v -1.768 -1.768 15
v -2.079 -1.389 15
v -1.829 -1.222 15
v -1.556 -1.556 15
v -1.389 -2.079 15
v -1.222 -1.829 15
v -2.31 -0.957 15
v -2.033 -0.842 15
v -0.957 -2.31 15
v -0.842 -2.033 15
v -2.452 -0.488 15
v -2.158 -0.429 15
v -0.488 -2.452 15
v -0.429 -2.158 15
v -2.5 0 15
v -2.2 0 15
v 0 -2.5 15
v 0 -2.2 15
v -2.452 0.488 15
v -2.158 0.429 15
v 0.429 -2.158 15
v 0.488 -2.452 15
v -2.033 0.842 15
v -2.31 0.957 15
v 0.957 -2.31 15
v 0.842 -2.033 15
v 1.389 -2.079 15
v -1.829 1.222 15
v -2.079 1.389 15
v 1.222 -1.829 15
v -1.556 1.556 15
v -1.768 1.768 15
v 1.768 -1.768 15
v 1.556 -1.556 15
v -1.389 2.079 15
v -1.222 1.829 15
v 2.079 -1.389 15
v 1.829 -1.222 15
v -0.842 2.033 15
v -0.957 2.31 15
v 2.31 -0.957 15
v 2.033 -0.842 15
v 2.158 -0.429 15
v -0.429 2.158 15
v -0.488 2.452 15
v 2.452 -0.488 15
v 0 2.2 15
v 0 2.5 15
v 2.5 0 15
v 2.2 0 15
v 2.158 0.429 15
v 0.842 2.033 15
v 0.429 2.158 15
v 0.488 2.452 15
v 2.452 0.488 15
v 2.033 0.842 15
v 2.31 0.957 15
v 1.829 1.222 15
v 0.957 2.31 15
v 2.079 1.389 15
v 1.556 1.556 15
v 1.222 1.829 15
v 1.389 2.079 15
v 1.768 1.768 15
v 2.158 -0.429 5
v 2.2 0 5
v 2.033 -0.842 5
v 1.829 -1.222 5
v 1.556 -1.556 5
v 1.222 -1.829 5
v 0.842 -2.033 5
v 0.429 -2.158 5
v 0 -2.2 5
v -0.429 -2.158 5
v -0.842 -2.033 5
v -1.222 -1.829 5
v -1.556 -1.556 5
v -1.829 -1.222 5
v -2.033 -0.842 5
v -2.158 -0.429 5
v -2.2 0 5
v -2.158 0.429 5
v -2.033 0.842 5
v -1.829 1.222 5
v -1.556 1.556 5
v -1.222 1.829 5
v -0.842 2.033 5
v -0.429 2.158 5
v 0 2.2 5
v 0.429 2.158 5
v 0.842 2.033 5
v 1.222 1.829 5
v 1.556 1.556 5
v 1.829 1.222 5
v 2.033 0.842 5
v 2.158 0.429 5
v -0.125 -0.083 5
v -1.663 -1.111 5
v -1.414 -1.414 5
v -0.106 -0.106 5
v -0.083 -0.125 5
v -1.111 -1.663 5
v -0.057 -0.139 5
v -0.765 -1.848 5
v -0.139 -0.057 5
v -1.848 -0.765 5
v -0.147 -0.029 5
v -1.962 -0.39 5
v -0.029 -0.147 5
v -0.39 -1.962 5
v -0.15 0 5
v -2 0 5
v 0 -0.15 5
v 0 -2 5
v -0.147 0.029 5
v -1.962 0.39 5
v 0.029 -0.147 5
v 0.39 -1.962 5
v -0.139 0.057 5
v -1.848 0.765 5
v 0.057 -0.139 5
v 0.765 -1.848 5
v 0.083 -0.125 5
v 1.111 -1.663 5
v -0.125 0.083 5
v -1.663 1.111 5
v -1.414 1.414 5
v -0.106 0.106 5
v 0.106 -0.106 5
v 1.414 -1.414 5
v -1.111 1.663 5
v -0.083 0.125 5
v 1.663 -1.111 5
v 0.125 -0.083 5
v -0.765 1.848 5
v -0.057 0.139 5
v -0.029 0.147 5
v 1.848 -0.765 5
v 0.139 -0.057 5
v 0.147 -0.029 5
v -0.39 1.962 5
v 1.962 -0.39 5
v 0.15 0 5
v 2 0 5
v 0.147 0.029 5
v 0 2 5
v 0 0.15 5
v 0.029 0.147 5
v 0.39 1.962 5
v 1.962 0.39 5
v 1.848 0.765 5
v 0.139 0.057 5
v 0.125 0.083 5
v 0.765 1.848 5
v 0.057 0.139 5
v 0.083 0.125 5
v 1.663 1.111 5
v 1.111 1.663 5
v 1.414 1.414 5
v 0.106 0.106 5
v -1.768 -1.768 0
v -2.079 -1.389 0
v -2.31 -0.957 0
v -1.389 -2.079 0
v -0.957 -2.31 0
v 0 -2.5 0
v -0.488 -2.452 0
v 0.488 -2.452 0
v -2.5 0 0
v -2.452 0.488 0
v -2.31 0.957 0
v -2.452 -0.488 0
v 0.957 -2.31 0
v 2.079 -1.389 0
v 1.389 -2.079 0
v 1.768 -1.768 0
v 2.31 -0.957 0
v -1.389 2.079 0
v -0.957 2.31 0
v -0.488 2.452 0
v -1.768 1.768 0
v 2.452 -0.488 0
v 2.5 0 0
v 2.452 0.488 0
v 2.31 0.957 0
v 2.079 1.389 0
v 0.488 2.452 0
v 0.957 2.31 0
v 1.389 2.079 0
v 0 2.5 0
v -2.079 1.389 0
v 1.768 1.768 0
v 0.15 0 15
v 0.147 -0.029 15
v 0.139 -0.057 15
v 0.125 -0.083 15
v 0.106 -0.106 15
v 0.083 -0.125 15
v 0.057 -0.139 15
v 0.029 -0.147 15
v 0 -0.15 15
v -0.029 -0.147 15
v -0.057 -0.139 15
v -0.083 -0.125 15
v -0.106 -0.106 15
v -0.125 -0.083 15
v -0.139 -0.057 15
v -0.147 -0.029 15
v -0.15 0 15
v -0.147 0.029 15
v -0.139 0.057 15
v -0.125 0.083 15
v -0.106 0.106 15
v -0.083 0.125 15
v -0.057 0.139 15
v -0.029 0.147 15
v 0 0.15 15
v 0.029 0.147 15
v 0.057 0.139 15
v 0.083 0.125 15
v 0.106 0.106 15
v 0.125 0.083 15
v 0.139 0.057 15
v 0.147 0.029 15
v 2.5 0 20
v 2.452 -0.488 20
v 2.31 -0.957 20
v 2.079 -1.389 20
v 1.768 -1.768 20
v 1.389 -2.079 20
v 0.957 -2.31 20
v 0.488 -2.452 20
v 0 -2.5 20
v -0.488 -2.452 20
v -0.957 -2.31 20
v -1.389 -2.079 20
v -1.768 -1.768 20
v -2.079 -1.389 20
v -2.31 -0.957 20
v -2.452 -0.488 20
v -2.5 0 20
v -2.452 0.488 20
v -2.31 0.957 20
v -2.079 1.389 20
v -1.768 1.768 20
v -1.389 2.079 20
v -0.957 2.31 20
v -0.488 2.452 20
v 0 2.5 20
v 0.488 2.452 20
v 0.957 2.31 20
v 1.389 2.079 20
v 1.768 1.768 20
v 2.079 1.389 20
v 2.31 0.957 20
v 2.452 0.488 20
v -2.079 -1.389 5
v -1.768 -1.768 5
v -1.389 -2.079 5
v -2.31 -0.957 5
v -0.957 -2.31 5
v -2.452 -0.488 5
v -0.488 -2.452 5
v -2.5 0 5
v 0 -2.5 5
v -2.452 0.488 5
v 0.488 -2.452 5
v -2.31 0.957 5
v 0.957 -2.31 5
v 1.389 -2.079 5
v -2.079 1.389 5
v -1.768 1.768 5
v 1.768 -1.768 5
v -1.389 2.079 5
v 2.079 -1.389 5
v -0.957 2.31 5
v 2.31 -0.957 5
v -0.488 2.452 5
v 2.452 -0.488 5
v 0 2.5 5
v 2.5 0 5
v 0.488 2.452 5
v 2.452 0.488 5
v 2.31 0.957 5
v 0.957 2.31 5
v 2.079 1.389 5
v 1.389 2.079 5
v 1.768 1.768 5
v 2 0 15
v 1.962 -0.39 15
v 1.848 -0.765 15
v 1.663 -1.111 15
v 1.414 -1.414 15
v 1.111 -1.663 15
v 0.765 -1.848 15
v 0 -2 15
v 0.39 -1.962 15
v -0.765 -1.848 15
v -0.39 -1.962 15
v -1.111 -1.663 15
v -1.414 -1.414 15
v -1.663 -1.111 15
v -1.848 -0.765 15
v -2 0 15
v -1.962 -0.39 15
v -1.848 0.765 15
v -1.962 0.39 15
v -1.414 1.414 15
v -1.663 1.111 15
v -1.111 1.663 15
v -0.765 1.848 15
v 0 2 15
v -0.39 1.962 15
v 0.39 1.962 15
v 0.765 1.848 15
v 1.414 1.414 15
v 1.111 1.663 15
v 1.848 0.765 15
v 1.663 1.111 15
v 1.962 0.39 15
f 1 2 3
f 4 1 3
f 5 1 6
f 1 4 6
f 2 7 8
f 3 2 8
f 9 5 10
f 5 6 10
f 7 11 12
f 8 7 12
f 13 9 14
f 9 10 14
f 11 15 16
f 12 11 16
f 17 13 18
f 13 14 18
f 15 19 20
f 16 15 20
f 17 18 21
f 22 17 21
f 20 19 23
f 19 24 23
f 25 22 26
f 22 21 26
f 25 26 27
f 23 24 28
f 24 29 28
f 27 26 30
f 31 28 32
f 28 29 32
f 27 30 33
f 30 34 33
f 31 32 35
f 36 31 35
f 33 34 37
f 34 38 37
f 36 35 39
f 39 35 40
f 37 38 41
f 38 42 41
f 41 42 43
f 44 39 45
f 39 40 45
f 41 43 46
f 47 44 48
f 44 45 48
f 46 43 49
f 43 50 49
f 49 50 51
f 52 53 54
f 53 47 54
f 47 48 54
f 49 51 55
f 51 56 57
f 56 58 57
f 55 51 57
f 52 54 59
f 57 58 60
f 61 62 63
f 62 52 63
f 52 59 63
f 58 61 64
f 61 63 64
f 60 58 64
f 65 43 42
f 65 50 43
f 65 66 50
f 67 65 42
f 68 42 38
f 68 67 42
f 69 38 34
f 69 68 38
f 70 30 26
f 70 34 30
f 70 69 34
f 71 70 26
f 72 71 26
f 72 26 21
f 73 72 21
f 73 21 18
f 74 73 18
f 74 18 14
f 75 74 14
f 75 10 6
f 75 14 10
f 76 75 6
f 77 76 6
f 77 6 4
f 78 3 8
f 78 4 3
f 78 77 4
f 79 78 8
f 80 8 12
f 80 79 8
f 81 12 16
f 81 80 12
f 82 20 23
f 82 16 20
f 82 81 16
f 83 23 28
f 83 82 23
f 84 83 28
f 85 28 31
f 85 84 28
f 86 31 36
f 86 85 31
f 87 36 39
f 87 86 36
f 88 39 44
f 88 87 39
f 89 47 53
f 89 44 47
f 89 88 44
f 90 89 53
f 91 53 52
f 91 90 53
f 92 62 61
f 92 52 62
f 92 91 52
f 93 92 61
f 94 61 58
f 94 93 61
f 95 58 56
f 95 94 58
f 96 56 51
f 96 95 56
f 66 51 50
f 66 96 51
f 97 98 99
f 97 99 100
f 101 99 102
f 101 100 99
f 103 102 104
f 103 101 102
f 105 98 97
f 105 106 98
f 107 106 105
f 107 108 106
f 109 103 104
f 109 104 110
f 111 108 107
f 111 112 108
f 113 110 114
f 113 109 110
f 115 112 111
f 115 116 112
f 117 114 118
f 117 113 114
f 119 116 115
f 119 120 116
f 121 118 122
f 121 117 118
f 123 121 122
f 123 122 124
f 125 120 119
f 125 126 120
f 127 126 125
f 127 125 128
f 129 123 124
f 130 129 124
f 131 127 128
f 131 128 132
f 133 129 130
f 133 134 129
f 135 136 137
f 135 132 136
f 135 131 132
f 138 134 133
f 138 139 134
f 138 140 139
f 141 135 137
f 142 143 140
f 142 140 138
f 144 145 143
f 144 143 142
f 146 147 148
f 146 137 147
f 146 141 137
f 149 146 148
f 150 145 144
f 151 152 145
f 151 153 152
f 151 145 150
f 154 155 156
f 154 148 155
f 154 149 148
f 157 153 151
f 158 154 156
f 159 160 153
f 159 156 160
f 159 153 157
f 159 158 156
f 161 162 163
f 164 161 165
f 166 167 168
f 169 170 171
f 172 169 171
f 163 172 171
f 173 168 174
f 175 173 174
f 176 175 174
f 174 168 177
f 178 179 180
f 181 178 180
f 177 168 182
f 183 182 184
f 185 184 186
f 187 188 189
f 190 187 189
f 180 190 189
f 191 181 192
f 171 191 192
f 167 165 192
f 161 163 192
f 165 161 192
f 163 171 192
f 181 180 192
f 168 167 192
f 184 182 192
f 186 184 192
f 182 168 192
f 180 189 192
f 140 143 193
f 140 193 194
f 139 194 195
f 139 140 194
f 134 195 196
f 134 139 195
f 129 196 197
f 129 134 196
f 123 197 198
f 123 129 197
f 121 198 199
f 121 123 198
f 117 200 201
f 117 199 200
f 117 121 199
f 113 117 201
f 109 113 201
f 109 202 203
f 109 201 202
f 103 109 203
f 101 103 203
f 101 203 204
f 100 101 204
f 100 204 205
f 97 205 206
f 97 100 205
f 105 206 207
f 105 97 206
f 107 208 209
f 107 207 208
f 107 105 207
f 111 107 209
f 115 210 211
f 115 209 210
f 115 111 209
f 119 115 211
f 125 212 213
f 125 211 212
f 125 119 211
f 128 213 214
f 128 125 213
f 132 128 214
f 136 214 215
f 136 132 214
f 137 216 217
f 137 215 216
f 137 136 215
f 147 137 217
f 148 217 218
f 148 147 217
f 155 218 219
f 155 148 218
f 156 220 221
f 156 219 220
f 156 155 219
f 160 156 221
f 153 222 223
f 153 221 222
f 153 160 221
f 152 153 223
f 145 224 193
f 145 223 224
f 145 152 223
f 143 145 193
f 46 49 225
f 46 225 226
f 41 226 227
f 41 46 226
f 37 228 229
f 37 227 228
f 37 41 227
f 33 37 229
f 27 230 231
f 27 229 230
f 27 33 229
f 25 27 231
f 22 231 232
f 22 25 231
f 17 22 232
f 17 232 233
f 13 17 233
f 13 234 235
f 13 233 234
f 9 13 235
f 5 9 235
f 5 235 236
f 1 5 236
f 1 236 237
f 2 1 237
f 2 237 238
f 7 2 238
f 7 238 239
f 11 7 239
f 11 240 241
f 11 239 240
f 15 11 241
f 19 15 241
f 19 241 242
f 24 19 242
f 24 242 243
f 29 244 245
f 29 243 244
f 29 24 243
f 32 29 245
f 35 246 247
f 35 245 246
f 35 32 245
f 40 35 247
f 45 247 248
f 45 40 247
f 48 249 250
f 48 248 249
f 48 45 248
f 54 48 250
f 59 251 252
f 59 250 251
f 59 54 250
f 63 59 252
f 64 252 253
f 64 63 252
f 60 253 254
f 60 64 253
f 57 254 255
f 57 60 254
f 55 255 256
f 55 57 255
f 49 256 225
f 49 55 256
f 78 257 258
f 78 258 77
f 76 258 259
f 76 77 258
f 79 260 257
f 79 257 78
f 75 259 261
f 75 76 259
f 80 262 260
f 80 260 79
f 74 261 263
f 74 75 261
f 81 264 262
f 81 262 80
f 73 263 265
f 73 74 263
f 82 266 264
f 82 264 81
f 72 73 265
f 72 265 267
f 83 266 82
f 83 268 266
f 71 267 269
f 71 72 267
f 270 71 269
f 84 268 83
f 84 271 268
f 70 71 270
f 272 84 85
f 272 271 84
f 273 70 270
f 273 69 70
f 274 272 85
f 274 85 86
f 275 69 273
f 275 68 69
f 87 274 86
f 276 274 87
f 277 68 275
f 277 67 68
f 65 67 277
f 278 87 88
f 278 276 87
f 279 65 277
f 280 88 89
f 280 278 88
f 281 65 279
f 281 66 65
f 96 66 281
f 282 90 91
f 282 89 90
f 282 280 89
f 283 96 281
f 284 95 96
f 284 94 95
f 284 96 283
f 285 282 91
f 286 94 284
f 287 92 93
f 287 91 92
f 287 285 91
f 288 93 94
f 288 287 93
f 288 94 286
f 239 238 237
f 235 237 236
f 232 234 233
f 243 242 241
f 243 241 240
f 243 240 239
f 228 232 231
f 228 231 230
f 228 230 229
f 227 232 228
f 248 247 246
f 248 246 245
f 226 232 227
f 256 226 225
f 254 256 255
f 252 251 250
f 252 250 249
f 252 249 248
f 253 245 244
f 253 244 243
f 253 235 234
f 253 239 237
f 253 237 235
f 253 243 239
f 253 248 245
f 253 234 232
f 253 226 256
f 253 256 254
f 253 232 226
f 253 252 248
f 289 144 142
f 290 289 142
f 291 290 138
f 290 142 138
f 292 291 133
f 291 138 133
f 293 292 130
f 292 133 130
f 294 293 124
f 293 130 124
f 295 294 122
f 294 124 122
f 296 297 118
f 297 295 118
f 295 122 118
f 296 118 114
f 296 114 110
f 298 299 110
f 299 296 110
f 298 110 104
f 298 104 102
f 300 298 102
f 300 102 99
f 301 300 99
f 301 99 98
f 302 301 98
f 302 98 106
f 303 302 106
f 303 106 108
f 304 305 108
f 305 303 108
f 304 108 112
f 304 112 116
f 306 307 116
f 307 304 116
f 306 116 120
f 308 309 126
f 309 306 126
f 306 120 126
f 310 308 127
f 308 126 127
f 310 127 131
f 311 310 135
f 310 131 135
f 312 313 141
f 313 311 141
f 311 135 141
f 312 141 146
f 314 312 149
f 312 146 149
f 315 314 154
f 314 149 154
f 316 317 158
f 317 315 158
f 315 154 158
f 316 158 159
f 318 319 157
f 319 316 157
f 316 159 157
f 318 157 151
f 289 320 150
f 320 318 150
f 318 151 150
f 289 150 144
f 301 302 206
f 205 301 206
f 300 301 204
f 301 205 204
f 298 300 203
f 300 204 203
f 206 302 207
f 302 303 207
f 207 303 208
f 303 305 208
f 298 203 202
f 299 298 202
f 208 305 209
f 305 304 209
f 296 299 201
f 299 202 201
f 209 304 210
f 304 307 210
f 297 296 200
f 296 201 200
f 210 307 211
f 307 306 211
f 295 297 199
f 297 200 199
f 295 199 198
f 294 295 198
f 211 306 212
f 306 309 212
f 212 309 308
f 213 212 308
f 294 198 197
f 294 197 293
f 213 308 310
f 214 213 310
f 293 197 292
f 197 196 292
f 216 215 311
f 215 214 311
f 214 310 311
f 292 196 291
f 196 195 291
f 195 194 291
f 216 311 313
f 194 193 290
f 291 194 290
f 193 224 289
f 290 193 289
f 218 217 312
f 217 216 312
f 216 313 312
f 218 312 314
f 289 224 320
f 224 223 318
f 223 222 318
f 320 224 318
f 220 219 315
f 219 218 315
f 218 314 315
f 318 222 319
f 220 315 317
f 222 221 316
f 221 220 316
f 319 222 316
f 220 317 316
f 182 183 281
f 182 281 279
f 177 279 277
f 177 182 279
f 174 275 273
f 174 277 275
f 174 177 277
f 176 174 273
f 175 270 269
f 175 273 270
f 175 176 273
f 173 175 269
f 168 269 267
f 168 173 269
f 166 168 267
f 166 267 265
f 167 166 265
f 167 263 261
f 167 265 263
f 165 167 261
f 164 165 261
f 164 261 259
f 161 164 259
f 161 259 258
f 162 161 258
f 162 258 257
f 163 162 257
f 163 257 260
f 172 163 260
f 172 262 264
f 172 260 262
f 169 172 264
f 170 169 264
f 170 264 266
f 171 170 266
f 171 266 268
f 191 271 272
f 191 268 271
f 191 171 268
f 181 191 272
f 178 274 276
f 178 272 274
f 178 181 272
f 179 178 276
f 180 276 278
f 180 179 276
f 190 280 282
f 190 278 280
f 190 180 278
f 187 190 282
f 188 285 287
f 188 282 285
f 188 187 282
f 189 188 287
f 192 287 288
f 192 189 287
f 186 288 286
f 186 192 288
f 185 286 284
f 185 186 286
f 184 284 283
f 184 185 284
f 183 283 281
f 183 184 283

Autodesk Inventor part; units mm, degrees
ref_plane "YZ Plane" through (0, 0, 0) normal (1, 0, 0) x (0, 1, 0)
ref_plane "XZ Plane" through (0, 0, 0) normal (0, 1, 0) x (-1, 0, 0)
ref_plane "XY Plane" through (0, 0, 0) normal (0, 0, 1) x (1, 0, 0)
sketch "Sketch1" plane through (0, 0, 0) normal (0, 0, 1) x (1, 0, 0)
  circle A0 centre (0, 0) radius 2.5
  dimension "d0" = 5
extrude "Extrusion1" add sketch "Sketch1" along normal blind 5
sketch "Sketch2" plane through (0, 0, 5) normal (0, 0, 1) x (1, 0, 0)
  circle A0 centre (0, 0) radius 2.2
  circle A1 centre (0, 0) radius 2.5 projected
  circle A2 centre (0, 0) radius 2
  dimension "d3" = 4.4
  dimension "d4" = 4
extrude "Extrusion2" add sketch "Sketch2" along normal blind 10 contours A0
sketch "Sketch3" plane through (0, 0, 5) normal (0, 0, 1) x (1, 0, 0)
  circle A0 centre (0, 0) radius 0.15
  dimension "d7" = 0.3
extrude "Extrusion3" add sketch "Sketch3" along normal blind 10
sketch "Sketch4" plane through (0, 0, 15) normal (0, 0, 1) x (1, 0, 0)
  circle A0 centre (0, 0) radius 2.5
extrude "Extrusion4" add sketch "Sketch4" along normal blind 5
properties part number "EuropeanFuse3A"
